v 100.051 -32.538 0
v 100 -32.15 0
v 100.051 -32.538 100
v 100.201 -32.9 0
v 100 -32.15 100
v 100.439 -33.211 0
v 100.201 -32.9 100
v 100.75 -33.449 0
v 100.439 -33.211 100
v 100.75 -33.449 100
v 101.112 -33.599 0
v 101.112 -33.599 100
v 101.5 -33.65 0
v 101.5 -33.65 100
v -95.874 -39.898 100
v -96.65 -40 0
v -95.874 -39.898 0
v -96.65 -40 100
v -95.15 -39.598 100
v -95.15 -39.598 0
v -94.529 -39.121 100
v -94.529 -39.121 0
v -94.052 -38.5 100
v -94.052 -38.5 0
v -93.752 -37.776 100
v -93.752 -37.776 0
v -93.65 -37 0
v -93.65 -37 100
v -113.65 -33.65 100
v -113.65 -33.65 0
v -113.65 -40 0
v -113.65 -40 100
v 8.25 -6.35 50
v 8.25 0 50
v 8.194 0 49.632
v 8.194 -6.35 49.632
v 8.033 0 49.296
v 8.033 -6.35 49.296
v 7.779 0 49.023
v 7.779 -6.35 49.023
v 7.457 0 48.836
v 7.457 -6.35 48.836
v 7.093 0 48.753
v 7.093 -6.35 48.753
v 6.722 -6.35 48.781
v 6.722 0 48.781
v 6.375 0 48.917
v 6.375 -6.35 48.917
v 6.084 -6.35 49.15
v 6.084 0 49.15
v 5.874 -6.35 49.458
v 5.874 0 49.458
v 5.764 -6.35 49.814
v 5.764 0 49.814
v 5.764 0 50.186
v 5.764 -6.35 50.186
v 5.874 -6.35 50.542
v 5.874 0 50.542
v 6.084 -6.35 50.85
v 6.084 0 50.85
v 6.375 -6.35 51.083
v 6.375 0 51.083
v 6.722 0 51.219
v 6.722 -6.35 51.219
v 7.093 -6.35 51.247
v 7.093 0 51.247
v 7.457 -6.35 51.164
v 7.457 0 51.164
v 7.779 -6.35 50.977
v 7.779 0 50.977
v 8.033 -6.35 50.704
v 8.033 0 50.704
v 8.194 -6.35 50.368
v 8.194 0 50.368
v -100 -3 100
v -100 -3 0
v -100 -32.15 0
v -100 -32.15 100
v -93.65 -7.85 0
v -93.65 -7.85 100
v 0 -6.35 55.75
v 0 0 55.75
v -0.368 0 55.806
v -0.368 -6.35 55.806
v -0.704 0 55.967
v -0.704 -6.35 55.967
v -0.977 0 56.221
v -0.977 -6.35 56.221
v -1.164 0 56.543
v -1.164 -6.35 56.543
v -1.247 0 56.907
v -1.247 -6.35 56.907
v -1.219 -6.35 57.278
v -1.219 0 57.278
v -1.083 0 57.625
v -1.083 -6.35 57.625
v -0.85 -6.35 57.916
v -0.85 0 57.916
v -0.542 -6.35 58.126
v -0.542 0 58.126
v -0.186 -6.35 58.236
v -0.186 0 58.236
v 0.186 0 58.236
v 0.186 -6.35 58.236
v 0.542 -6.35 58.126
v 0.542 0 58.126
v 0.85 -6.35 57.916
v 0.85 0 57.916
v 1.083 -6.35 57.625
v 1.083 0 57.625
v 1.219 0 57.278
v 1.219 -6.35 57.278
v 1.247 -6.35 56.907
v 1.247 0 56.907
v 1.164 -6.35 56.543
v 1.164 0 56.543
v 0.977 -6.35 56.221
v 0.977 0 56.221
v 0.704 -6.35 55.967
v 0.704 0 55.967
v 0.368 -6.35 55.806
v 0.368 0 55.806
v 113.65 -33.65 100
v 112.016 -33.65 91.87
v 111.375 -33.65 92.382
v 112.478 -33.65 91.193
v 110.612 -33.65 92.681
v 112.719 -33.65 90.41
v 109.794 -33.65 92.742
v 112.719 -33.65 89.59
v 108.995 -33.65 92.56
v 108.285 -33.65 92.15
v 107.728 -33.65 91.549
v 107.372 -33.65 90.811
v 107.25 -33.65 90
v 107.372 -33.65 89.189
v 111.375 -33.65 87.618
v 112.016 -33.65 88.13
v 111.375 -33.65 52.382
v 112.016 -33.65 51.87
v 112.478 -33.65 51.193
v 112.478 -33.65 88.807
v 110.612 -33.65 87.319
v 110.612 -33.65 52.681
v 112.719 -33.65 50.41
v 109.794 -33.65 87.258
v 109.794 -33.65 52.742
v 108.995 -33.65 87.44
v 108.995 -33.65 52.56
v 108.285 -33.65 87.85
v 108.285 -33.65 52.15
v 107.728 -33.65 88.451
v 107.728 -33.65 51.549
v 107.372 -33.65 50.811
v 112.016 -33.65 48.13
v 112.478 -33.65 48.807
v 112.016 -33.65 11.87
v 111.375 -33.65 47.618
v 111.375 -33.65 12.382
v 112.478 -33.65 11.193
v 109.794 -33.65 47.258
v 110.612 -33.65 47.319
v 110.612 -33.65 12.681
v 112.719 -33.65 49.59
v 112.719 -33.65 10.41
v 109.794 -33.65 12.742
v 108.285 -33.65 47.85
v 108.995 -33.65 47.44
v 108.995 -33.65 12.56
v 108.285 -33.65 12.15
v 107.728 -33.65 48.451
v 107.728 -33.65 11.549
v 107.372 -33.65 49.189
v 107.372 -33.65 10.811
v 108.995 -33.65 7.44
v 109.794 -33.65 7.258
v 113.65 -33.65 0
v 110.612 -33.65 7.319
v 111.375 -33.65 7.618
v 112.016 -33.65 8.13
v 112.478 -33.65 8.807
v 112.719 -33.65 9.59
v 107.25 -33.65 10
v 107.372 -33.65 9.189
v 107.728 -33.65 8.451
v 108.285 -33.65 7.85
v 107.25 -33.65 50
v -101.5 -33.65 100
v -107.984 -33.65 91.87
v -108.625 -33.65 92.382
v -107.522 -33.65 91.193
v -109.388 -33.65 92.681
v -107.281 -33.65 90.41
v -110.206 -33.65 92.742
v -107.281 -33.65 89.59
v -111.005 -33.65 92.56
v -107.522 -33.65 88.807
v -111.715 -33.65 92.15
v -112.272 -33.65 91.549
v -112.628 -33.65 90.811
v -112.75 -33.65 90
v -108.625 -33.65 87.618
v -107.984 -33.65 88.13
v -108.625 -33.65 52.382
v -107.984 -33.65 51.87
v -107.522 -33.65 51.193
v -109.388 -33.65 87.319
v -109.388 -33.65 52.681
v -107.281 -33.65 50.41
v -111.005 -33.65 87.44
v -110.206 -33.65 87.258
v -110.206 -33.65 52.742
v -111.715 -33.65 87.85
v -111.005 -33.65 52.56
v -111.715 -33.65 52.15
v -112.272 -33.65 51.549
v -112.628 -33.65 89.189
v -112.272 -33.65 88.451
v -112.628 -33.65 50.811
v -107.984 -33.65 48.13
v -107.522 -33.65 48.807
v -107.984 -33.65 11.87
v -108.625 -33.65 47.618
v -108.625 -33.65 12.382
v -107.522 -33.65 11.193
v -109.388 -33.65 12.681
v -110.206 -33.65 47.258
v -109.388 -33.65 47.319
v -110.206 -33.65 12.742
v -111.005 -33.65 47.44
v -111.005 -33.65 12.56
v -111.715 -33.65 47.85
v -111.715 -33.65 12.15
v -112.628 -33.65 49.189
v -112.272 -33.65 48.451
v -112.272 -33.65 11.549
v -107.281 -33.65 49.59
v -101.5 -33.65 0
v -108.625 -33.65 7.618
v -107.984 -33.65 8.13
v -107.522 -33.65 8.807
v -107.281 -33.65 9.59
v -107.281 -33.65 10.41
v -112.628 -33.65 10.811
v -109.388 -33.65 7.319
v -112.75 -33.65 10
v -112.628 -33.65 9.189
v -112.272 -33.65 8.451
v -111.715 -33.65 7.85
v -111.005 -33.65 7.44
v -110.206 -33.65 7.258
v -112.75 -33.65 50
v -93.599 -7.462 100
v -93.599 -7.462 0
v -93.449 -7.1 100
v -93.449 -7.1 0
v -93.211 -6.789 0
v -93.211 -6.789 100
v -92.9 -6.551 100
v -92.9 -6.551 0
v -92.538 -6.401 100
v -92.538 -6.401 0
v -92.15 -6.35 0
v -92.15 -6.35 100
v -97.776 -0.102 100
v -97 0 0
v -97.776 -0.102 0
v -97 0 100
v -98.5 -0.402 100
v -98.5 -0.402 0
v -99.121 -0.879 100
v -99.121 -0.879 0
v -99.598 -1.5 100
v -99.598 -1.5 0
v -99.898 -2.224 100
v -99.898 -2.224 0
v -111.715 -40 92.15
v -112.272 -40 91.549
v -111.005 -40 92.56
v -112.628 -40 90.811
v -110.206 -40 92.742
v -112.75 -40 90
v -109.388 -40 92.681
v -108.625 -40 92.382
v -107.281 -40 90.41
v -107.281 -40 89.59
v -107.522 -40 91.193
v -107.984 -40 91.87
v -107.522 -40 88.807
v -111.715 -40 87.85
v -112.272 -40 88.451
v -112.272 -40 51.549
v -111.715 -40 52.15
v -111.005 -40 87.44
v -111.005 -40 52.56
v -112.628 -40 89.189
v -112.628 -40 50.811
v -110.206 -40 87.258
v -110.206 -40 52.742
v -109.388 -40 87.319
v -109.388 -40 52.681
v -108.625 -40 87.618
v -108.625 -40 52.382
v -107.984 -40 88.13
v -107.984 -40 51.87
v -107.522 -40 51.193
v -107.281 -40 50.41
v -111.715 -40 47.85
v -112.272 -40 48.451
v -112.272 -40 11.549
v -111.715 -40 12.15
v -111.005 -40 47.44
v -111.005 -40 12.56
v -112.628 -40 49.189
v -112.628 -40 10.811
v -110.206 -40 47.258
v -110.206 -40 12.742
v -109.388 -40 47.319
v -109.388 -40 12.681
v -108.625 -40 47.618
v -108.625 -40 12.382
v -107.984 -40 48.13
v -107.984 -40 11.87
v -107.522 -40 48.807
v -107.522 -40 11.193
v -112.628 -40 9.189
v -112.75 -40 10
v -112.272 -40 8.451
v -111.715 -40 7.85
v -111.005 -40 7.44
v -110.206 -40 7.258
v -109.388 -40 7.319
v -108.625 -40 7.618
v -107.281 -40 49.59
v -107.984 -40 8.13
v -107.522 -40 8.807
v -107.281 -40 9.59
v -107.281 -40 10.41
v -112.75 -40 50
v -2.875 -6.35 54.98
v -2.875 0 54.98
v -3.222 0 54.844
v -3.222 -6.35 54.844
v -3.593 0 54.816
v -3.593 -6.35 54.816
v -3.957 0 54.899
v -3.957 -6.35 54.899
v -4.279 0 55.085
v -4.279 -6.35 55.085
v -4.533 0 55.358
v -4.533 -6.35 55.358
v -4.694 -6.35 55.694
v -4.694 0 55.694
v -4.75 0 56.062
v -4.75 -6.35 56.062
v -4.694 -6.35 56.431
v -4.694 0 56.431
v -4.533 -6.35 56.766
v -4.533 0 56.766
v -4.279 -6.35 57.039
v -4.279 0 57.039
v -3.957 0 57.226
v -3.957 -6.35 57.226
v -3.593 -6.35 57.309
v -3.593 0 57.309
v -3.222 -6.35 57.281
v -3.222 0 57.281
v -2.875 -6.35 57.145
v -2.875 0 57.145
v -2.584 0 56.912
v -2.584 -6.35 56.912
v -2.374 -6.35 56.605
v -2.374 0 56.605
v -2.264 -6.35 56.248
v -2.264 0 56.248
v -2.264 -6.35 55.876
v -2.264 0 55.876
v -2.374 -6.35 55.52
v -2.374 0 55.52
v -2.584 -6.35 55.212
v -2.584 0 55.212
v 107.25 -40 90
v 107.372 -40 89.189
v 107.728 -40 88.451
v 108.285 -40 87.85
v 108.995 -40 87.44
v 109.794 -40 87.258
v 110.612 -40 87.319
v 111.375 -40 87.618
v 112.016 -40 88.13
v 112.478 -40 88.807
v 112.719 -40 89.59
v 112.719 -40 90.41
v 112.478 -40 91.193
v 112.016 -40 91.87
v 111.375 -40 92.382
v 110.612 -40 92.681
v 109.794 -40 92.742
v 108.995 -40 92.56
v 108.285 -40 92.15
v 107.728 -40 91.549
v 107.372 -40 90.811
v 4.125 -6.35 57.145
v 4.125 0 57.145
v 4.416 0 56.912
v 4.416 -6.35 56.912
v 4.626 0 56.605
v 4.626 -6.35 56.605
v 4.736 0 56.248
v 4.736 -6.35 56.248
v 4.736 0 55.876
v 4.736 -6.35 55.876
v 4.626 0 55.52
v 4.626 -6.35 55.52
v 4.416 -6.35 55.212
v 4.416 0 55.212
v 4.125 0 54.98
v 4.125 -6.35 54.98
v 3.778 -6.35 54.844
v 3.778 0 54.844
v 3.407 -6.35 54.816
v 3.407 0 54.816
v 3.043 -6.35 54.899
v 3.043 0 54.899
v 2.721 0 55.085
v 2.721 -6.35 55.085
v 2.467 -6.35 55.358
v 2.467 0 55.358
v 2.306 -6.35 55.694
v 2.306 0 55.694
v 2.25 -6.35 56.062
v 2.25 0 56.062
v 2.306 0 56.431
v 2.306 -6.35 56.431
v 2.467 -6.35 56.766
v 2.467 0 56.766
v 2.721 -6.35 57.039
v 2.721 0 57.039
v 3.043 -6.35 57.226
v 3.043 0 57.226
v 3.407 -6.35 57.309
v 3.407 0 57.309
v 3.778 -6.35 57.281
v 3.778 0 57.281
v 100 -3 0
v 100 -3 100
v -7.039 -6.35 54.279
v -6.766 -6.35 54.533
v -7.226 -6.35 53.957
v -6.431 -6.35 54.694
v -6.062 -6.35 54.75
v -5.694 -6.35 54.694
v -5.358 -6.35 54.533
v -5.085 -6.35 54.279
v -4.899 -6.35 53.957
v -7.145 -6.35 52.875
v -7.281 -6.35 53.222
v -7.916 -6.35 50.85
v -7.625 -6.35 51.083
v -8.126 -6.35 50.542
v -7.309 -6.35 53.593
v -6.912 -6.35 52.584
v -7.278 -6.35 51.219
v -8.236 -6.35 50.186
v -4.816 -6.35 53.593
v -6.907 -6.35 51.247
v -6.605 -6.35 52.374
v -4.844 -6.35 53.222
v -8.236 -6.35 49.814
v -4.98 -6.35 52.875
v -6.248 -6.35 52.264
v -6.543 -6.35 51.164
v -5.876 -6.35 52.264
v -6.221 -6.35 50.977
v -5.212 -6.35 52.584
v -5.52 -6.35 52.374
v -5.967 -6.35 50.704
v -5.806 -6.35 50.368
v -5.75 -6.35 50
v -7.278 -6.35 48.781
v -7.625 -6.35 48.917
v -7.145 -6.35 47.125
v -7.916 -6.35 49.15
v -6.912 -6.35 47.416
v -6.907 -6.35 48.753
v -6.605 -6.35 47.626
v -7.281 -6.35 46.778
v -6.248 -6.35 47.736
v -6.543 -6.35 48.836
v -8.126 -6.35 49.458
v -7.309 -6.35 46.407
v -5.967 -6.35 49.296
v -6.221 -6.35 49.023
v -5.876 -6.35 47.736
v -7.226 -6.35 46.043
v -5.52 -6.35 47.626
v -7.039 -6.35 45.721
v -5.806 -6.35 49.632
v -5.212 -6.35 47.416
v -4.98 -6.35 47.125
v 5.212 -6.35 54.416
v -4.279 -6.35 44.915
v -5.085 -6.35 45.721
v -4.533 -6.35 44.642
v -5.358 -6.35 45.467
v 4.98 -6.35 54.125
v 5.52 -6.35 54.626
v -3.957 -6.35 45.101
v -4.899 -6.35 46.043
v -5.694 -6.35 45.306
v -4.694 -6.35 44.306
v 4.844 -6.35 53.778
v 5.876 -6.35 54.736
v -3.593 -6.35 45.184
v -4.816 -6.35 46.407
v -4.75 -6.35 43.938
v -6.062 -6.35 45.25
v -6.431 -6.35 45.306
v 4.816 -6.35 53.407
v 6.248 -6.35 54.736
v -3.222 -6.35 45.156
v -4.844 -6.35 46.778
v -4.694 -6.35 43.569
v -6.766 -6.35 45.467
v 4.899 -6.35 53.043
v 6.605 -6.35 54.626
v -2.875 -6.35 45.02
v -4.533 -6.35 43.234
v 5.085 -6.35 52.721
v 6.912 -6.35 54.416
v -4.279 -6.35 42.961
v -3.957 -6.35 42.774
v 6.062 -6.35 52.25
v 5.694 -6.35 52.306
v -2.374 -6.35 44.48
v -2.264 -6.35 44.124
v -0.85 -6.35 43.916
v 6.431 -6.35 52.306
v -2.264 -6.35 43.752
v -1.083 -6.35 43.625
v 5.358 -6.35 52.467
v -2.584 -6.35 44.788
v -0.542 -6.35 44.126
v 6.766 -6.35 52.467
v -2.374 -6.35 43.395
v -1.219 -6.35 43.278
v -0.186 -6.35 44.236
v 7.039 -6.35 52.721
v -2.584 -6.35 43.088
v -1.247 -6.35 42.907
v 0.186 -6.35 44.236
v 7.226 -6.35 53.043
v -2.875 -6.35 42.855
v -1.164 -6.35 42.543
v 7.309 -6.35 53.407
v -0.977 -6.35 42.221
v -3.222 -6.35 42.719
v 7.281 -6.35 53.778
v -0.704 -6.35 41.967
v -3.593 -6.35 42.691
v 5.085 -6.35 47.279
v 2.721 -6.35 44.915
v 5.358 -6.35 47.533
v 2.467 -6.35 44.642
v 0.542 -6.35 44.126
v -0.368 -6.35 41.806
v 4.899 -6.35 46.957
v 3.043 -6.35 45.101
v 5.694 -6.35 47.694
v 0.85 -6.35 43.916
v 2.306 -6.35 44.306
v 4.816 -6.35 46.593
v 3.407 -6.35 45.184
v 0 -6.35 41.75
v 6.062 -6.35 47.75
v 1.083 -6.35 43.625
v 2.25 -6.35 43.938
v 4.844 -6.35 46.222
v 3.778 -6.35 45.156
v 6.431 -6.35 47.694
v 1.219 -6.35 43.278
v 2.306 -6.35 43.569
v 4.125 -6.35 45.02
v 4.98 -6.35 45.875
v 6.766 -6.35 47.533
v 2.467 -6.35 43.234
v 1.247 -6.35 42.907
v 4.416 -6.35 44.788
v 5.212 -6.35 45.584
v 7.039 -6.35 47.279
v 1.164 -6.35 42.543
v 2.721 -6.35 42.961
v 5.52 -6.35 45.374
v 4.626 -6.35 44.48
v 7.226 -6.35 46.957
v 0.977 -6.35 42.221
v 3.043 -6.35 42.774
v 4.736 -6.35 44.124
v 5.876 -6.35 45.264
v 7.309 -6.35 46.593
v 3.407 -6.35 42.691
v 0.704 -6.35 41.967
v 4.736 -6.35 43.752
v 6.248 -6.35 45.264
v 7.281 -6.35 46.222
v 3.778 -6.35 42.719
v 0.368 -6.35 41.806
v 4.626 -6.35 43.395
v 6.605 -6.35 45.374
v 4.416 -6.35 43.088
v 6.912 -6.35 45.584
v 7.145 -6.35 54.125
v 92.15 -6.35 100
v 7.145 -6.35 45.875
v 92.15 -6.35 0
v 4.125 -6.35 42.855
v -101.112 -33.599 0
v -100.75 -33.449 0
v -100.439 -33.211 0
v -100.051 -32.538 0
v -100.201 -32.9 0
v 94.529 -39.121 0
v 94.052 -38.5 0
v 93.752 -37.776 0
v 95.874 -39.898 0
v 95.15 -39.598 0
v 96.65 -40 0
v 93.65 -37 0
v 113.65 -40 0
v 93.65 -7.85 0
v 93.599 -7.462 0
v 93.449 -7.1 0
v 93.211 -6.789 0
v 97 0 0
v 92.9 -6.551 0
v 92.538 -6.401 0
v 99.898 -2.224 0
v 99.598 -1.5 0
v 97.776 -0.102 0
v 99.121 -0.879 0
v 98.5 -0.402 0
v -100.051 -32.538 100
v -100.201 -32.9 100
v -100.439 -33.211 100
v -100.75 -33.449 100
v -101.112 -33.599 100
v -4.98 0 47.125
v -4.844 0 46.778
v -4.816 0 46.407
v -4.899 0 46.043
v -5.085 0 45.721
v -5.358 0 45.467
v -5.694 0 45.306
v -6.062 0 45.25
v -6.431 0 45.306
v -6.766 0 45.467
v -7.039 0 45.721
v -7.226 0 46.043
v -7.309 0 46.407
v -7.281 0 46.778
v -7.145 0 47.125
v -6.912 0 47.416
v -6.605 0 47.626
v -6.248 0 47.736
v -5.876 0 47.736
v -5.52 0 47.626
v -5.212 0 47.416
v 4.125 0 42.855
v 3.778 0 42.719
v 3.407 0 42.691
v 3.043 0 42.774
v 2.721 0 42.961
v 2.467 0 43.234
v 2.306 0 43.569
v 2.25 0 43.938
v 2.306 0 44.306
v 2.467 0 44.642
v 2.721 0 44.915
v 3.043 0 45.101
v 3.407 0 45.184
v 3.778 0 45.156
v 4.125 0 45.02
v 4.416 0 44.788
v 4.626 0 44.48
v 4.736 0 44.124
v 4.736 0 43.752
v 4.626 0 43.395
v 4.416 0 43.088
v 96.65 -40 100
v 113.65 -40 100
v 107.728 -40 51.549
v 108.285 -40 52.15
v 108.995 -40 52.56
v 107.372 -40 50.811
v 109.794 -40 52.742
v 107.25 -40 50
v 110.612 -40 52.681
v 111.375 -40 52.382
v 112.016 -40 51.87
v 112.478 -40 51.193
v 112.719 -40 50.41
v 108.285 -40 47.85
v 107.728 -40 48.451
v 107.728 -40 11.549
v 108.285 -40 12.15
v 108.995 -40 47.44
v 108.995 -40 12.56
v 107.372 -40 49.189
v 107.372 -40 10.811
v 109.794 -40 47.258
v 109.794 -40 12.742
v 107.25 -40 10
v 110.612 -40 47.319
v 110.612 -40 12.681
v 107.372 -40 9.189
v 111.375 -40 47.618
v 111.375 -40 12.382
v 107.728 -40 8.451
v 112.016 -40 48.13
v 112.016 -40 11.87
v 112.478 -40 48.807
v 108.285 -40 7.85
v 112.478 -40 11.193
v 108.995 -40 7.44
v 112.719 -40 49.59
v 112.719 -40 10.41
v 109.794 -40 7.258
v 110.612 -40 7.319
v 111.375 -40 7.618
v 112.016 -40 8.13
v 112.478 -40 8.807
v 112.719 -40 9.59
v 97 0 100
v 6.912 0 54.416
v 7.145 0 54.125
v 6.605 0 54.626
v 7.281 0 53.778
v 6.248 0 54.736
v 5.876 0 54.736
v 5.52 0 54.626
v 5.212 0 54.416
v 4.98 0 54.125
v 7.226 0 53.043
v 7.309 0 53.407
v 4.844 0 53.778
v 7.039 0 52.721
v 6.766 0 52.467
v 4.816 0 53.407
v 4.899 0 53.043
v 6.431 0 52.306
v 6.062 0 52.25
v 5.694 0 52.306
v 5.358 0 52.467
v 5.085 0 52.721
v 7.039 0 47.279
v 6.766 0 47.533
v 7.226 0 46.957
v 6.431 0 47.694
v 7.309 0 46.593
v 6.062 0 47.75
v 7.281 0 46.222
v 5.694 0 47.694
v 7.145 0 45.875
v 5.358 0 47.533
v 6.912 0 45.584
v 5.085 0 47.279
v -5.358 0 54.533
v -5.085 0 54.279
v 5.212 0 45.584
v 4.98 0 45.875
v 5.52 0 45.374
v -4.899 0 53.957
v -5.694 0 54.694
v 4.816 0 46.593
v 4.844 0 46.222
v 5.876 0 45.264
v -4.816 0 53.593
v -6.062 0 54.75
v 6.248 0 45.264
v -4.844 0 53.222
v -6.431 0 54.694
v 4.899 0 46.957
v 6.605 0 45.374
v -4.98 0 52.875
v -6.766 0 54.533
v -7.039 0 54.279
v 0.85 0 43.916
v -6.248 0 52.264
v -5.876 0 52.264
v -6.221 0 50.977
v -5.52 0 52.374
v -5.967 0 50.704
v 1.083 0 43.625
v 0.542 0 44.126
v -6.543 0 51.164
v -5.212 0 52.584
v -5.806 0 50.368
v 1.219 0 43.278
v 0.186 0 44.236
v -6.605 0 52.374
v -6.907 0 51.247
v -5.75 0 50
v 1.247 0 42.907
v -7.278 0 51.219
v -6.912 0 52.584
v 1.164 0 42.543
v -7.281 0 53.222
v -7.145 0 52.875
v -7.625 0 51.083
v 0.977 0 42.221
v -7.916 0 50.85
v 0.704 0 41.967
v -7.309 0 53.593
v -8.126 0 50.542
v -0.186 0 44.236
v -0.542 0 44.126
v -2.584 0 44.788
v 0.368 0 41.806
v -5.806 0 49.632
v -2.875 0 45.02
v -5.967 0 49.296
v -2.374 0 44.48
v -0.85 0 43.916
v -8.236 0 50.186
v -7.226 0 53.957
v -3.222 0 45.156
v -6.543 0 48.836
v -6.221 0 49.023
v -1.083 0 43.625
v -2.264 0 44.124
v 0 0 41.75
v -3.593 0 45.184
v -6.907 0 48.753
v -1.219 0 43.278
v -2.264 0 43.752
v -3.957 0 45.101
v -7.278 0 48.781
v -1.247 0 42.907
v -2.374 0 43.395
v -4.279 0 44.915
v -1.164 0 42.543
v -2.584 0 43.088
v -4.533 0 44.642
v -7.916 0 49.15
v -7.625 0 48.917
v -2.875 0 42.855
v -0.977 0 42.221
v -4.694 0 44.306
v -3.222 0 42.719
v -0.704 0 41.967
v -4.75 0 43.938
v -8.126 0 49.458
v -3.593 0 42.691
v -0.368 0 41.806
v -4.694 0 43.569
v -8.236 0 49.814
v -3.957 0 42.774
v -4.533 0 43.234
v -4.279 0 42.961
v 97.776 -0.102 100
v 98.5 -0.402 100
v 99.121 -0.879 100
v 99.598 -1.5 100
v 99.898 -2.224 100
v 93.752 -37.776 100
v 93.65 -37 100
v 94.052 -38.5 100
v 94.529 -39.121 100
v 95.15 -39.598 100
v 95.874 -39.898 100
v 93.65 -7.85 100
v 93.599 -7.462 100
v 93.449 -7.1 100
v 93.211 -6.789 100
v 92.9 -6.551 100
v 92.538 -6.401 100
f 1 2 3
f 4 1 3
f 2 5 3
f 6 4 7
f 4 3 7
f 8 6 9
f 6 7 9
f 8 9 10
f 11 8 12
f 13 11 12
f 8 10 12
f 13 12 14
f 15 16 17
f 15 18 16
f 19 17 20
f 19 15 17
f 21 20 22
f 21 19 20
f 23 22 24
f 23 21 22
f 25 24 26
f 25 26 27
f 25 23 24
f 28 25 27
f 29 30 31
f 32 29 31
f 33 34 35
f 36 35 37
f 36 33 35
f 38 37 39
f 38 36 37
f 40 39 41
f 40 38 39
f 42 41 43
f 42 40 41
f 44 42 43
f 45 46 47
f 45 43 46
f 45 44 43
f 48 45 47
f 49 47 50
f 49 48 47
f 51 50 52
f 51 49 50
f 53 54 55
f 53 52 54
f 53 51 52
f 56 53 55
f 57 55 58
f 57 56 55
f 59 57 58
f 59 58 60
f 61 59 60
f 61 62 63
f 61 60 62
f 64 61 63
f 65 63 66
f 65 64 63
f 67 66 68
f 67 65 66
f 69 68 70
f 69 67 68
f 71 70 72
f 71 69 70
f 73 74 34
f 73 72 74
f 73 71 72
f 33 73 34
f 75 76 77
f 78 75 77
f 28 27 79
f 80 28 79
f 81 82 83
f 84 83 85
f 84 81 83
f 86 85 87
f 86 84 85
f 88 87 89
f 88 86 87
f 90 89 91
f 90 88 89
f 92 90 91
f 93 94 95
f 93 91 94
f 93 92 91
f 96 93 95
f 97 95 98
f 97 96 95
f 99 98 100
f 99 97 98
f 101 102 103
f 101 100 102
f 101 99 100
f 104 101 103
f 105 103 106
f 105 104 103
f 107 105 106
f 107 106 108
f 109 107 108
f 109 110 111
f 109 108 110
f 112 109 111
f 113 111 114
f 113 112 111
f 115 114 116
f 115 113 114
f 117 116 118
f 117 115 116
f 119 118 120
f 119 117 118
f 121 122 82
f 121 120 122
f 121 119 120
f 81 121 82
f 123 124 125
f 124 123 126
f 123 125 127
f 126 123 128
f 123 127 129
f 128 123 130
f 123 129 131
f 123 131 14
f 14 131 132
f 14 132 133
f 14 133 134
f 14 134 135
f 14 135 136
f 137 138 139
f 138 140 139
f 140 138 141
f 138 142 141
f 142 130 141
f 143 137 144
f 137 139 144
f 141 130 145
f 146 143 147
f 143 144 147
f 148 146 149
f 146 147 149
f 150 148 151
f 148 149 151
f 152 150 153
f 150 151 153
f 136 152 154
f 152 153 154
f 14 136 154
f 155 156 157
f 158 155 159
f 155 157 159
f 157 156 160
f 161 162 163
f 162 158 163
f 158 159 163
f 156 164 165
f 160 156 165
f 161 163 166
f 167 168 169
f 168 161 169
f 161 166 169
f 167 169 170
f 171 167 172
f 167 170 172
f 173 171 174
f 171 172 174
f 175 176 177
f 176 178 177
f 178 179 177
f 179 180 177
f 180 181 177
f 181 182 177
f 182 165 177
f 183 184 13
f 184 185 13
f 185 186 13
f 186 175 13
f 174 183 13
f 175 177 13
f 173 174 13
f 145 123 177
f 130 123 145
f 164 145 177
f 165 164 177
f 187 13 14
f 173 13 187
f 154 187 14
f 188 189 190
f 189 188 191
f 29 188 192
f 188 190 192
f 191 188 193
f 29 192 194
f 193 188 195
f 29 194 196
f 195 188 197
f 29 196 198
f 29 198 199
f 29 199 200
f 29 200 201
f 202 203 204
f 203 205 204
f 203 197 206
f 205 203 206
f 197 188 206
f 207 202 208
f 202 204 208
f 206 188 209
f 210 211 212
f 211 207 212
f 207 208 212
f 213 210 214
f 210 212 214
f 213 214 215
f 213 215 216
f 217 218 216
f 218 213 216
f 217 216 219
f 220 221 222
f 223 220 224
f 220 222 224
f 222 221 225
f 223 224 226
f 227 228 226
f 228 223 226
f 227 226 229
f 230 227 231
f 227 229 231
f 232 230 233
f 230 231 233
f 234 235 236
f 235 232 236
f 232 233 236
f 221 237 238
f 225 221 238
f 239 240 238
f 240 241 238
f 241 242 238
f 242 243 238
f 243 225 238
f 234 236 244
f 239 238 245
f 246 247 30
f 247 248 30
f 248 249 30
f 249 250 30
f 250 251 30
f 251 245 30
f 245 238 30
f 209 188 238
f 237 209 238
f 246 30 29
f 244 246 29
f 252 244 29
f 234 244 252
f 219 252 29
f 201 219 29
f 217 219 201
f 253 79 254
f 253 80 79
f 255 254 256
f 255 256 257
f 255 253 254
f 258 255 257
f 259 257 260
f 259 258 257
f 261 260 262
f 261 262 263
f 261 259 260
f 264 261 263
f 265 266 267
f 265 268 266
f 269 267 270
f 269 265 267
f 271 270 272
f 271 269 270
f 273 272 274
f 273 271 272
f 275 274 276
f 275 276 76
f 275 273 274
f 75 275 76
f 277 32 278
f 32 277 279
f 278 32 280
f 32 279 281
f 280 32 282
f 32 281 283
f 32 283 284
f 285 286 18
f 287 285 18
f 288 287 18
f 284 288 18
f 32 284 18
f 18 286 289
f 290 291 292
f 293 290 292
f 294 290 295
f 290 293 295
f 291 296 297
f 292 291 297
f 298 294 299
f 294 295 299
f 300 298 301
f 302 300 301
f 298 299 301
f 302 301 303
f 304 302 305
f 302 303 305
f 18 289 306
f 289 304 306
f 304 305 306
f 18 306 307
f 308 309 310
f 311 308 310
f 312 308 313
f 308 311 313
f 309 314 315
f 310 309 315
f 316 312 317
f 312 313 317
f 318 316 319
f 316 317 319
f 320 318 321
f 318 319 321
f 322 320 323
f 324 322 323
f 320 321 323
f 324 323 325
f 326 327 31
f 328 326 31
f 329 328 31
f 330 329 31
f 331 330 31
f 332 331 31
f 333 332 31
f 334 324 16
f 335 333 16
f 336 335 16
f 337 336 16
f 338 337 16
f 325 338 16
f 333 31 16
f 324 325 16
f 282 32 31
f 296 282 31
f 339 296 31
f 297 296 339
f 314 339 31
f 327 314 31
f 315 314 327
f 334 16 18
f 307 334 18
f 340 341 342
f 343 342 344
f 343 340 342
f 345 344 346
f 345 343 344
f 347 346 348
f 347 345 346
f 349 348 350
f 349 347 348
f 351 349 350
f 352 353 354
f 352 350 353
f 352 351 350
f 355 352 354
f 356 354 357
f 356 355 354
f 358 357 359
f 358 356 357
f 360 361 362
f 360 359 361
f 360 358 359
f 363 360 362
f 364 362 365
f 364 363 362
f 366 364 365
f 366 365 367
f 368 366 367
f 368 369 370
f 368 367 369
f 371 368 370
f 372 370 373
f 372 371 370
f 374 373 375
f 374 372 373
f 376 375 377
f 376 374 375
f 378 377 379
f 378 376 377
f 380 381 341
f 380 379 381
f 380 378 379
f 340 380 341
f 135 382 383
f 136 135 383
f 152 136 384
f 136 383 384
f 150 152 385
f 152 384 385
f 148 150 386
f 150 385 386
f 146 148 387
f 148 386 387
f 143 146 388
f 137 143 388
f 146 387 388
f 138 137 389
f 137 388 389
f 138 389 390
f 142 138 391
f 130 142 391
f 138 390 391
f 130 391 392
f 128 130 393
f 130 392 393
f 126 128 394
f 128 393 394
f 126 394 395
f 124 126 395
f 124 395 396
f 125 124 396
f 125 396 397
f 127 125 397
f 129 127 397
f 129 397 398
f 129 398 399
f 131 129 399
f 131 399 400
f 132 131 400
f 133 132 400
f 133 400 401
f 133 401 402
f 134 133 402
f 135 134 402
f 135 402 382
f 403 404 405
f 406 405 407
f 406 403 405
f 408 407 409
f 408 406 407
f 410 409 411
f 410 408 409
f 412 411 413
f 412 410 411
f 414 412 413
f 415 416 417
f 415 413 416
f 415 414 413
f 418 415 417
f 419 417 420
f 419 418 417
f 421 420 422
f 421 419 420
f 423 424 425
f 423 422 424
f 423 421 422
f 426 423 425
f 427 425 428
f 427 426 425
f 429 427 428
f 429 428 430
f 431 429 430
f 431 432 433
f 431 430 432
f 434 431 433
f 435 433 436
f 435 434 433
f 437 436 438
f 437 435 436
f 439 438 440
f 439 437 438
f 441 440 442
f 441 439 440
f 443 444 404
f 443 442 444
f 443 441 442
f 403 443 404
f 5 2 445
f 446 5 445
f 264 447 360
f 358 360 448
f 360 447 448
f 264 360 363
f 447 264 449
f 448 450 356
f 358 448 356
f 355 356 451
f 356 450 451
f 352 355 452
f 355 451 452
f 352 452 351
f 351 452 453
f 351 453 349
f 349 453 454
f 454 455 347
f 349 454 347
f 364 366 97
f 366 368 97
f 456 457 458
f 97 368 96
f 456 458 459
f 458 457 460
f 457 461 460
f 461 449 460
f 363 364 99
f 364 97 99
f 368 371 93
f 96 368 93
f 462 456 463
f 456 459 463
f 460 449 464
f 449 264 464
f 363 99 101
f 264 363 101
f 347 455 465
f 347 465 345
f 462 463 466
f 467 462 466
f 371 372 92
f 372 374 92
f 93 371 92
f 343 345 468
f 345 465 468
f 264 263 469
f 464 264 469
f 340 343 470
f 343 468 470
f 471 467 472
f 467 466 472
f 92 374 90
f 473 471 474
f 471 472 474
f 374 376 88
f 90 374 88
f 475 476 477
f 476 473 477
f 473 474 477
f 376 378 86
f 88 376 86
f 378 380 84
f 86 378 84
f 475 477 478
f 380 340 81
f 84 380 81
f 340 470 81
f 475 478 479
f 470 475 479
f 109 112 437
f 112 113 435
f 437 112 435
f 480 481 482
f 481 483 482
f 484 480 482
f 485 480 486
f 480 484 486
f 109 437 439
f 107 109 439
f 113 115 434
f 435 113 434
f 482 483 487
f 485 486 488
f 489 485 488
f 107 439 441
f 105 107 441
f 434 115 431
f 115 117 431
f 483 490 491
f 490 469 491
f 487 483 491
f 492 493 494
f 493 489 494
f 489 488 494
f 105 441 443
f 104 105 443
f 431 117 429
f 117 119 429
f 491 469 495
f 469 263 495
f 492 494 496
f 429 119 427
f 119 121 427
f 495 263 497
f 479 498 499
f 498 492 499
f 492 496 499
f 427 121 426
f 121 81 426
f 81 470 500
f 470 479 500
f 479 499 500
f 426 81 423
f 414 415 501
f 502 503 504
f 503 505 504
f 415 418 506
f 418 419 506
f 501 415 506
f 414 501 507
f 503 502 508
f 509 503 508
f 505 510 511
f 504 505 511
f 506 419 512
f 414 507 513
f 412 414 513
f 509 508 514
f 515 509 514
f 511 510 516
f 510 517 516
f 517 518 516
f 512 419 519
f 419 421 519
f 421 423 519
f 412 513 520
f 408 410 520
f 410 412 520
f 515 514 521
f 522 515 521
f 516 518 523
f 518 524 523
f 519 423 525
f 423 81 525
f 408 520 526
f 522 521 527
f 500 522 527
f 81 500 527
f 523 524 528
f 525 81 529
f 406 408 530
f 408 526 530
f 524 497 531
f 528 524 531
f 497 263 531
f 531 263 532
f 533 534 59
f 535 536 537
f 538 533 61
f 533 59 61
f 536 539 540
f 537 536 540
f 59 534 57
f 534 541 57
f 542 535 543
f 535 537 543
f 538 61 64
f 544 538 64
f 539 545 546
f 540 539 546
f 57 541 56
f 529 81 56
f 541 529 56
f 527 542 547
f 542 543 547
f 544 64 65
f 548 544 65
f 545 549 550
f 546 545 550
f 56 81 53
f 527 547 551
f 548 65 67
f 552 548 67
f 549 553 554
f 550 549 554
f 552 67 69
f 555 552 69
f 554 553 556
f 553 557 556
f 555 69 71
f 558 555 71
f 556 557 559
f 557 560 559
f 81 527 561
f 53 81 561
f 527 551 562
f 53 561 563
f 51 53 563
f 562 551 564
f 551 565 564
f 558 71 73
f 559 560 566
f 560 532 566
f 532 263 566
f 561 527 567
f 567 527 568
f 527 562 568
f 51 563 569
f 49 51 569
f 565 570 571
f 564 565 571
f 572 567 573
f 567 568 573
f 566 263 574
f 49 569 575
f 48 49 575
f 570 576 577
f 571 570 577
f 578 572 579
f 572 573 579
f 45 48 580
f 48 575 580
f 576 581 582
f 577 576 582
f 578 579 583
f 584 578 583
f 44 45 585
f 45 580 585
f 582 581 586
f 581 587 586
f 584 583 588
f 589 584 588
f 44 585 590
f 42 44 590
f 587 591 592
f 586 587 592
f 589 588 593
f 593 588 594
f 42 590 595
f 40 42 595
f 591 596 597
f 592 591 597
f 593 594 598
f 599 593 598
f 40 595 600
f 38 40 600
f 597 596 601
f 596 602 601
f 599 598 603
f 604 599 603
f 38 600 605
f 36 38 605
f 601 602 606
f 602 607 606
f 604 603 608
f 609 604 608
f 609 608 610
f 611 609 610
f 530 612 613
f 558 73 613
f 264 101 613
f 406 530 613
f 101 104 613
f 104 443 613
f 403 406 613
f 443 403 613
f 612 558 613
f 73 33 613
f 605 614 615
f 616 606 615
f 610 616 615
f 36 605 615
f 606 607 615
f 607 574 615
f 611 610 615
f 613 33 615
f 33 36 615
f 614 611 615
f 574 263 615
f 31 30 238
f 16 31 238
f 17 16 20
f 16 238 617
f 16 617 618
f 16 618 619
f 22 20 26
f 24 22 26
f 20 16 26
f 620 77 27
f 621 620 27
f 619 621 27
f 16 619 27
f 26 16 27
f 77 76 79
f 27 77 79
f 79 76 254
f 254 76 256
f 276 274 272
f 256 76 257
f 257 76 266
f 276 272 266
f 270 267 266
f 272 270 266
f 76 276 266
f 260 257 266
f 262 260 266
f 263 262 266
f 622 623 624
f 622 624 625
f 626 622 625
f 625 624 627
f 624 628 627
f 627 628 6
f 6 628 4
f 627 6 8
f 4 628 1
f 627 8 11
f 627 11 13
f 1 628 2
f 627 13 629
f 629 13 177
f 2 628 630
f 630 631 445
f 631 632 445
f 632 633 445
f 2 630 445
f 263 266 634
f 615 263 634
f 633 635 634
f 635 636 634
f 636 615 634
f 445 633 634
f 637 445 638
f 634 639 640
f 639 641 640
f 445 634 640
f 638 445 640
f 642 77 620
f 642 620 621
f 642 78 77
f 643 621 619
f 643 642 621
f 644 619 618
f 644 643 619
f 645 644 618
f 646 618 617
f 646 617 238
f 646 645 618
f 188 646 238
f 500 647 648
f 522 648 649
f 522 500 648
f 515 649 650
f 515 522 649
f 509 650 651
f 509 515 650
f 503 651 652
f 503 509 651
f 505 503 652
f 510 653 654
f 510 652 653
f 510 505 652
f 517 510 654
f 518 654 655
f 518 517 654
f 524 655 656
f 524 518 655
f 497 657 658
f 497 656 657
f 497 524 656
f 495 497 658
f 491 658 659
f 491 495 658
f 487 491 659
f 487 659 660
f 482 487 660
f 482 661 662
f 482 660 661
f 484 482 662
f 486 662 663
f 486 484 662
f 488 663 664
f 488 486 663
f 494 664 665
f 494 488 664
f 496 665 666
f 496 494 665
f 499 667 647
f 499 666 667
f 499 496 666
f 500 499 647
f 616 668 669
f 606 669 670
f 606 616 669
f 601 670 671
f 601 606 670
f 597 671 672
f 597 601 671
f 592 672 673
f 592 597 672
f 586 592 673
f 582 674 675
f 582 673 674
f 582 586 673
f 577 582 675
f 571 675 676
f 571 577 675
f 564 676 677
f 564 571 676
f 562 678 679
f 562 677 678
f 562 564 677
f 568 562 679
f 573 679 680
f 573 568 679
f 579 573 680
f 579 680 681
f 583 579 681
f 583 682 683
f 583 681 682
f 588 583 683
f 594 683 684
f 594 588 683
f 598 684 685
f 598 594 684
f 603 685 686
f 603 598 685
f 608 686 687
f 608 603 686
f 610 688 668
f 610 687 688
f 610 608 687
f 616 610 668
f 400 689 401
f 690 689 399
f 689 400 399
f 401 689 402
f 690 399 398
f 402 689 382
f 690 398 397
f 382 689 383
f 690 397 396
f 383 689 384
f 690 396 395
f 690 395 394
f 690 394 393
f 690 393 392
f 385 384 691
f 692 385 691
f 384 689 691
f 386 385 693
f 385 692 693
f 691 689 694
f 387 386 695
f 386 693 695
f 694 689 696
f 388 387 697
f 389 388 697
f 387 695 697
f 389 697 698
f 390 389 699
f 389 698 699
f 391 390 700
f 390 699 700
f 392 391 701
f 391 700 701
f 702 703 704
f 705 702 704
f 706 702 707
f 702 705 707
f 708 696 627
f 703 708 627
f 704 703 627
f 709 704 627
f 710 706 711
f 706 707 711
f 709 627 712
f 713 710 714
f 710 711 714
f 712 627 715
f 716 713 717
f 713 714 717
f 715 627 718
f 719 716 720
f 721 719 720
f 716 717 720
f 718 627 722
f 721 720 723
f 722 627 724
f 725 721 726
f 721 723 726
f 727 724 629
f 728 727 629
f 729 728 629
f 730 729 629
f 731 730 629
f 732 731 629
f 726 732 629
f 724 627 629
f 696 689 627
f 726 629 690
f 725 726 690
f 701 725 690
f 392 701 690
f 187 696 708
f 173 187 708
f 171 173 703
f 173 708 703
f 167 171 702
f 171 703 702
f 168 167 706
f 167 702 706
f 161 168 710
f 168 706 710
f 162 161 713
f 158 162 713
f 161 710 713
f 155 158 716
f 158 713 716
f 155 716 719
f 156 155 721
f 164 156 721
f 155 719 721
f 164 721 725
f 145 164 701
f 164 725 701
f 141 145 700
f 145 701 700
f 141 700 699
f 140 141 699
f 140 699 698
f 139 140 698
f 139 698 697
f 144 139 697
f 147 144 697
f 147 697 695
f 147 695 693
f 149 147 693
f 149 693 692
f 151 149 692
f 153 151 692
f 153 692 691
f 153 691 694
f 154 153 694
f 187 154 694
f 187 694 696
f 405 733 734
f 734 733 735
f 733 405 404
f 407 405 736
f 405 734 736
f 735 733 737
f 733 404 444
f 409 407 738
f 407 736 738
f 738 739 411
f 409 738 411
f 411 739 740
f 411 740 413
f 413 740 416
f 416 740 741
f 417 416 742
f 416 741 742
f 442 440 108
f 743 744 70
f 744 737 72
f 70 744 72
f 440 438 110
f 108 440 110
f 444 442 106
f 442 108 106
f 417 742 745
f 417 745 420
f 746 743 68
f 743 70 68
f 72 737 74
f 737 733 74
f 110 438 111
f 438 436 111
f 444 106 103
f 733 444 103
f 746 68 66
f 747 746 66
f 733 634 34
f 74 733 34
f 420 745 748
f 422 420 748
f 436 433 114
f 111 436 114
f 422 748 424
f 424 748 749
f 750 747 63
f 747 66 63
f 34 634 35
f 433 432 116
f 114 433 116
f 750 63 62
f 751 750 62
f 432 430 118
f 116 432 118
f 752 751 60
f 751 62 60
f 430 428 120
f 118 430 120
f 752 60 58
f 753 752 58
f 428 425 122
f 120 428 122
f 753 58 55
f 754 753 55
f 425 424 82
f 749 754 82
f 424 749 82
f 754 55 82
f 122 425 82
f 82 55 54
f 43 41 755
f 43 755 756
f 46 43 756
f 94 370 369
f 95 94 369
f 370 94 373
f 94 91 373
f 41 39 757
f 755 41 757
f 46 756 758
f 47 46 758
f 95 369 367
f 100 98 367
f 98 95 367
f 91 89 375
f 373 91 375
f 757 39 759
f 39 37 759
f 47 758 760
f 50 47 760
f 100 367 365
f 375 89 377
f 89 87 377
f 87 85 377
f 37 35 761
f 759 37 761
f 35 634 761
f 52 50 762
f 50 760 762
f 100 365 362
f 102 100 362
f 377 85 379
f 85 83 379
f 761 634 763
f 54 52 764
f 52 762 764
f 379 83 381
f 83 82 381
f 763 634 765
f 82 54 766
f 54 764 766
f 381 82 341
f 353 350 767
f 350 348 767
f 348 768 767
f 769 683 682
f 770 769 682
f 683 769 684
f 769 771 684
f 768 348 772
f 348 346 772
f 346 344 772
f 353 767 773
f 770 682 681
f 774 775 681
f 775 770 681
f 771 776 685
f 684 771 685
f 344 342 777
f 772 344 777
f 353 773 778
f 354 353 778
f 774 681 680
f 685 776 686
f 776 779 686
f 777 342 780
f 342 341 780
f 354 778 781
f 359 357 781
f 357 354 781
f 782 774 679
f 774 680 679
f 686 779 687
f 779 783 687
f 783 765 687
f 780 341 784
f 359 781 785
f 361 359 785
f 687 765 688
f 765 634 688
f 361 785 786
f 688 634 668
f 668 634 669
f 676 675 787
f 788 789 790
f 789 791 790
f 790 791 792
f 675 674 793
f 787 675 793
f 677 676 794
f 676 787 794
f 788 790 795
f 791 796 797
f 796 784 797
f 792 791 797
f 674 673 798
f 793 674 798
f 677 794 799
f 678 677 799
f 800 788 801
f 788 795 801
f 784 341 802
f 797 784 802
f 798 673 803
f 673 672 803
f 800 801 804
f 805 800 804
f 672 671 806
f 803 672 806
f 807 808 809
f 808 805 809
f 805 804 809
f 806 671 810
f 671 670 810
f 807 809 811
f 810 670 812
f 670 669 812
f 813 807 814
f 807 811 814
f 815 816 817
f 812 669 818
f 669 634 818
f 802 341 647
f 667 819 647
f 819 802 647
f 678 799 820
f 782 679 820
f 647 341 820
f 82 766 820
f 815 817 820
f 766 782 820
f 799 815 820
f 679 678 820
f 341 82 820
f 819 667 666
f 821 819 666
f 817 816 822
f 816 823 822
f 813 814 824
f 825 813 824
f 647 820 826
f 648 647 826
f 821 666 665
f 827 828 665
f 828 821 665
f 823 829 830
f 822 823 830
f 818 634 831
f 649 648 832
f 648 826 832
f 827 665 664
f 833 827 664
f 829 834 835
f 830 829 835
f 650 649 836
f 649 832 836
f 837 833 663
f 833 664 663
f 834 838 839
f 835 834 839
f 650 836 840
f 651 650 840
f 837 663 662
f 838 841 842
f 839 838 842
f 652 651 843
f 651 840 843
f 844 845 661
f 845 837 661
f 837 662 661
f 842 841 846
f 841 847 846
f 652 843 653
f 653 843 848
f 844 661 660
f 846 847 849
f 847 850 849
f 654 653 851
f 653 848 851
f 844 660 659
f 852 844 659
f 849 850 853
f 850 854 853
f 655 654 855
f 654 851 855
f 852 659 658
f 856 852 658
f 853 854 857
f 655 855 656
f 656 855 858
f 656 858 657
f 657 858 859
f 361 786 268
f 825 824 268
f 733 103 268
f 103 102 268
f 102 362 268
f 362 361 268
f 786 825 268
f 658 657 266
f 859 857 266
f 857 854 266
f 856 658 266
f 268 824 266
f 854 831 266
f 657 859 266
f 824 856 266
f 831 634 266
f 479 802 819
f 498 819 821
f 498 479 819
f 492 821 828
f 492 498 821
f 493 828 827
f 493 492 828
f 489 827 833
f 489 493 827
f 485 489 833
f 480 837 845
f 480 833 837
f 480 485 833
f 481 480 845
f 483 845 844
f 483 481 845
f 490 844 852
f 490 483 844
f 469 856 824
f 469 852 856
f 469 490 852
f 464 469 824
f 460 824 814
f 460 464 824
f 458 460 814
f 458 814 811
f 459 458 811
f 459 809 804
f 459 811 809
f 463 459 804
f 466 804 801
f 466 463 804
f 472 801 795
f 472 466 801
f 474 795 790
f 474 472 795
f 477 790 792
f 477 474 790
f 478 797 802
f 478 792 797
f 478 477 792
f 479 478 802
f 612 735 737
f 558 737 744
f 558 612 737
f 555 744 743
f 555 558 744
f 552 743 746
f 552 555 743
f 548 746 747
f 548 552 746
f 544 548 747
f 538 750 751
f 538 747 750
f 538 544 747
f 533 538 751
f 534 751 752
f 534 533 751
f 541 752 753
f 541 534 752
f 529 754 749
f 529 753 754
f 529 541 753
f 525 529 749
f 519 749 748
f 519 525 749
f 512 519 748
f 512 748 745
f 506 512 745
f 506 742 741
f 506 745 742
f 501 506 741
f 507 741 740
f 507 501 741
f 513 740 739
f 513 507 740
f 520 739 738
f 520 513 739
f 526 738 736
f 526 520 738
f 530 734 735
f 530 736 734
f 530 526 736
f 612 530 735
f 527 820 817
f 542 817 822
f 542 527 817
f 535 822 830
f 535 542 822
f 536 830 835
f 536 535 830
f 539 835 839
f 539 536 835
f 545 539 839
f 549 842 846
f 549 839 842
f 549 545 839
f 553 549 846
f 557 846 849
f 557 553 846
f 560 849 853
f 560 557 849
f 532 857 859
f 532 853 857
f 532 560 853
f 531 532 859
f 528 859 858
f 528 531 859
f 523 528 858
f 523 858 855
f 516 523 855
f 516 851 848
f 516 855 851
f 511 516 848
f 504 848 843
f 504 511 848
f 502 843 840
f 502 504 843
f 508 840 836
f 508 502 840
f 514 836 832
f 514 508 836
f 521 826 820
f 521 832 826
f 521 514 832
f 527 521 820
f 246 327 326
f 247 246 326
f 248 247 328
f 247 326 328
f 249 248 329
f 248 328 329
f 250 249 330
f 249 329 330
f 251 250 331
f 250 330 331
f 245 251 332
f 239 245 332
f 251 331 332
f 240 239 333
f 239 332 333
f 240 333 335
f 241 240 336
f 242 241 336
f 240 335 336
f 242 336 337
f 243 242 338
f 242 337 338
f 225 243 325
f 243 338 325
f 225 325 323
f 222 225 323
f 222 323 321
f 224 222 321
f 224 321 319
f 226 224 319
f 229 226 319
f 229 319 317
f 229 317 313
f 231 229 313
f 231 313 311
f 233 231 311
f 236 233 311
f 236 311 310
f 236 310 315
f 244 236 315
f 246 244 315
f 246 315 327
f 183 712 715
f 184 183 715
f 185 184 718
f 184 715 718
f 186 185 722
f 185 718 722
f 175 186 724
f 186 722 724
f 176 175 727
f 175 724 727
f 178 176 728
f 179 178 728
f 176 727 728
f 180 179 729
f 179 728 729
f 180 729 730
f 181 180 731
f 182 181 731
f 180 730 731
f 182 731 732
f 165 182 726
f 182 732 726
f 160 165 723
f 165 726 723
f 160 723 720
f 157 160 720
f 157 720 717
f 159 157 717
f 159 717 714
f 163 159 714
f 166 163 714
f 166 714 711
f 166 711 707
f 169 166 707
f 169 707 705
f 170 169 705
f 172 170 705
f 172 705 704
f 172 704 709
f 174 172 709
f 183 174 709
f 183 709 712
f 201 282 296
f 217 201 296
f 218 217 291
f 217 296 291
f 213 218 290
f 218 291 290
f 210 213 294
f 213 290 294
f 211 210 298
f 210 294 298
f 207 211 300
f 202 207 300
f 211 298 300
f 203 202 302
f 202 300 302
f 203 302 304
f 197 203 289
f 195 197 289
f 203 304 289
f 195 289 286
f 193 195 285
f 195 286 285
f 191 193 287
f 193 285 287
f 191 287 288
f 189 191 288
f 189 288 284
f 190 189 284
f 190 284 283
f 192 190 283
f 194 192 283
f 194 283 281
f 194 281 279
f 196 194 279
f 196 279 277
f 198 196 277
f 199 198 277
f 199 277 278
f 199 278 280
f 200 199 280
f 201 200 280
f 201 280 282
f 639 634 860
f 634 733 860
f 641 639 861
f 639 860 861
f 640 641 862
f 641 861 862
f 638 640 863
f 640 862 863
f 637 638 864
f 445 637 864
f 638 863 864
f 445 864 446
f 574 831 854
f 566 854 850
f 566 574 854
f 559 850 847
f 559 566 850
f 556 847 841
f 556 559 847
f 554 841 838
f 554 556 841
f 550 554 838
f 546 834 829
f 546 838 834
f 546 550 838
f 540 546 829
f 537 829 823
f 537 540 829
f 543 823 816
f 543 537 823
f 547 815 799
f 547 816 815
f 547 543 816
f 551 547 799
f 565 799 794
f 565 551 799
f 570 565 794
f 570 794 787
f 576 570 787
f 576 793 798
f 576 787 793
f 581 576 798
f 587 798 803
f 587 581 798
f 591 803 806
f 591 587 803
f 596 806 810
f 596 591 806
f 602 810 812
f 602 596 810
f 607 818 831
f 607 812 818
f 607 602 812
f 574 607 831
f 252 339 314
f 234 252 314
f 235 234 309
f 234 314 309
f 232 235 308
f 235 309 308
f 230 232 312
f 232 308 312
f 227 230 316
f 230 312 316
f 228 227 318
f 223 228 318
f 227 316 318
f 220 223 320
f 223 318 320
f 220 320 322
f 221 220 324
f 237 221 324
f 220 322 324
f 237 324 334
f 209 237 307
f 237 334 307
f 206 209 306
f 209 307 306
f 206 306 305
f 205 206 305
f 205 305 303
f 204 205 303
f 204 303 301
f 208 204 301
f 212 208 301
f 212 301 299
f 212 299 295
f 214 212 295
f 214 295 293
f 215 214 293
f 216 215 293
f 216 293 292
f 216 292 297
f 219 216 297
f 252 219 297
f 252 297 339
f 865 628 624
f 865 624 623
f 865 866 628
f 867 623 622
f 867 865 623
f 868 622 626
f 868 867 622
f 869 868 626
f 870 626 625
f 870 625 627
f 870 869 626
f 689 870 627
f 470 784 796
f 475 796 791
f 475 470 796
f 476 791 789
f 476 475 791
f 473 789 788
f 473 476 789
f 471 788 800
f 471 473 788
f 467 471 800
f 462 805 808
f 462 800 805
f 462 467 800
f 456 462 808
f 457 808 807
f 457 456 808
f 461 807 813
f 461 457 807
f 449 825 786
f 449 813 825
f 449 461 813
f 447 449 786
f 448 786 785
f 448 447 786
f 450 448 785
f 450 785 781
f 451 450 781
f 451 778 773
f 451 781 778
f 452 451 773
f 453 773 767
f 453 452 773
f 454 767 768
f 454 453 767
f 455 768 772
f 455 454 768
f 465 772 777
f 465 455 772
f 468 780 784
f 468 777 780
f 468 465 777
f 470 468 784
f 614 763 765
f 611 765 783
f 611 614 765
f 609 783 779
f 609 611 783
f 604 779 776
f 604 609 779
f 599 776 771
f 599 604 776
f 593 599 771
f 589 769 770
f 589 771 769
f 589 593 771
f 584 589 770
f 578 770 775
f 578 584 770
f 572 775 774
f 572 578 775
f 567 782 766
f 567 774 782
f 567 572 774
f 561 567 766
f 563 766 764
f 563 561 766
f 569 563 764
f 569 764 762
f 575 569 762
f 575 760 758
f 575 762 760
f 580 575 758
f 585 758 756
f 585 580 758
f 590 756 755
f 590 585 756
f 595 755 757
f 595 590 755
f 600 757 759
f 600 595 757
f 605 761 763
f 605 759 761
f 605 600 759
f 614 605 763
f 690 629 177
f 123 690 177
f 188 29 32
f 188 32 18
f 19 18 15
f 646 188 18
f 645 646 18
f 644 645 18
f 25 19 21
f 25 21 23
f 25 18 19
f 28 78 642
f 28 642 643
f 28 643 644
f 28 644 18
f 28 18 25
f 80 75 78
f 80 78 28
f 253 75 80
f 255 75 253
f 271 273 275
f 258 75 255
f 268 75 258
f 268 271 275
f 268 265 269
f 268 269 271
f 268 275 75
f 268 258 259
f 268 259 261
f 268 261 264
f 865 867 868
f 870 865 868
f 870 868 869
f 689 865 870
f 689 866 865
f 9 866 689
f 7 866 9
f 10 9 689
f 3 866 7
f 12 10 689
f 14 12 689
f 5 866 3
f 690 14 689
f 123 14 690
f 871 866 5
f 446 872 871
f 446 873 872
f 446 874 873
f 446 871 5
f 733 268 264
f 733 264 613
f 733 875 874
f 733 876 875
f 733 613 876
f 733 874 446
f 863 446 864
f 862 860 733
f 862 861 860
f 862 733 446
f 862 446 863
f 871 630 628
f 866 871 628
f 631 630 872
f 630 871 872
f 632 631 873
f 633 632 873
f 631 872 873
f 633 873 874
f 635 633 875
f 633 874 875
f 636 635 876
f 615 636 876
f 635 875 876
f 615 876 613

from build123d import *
from OCP.BRepFilletAPI import BRepFilletAPI_MakeFillet

# Parameters (mm, degrees)
BOSS_EXTRUDE1_DEPTH            = 100
FILLET1_R1                     = 3
FILLET1_R2                     = 1.5
F_2_5MM_DOWEL_HOLE1_AT_2_COUNT = 2
F_2_5MM_DOWEL_HOLE1_AT_2_PITCH = 14
CIRPATTERN3_COUNT              = 6
CIRPATTERN3_ANGLE              = 150
F_5_5_5_5_DIAMETER_HOLE1_D     = 5.5


with BuildPart() as part:
    # Sketch1 → Boss-Extrude1 (new body)
    with BuildSketch(Plane.XY):
        Polygon((100, 0), (-100, 0), (-100, -33.65), (-113.65, -33.65), (-113.65, -40), (-93.65, -40), (-93.65, -6.35), (93.65, -6.35), (93.65, -40), (113.65, -40), (113.65, -33.65), (100, -33.65), align=None)
    extrude(amount=BOSS_EXTRUDE1_DEPTH)

    # Fillet1: one fillet with a radius per group of edges: ONE call of the kernel's fillet builder (fillet() takes one radius for all edges)
    fillet1_edges_1 = [part.edges().sort_by_distance(p)[0] for p in [
        (-100, 0, 50),
        (-93.65, -40, 50),
        (100, 0, 50),
        (93.65, -40, 50),
    ]]
    fillet1_edges_2 = [part.edges().sort_by_distance(p)[0] for p in [
        (-93.65, -6.35, 50),
        (93.65, -6.35, 50),
        (100, -33.65, 50),
        (-100, -33.65, 50),
    ]]
    fillet1 = BRepFilletAPI_MakeFillet(part.part.solid().wrapped)
    for e in fillet1_edges_1:
        fillet1.Add(FILLET1_R1, e.wrapped)
    for e in fillet1_edges_2:
        fillet1.Add(FILLET1_R2, e.wrapped)
    add(Compound.cast(fillet1.Shape()), mode=Mode.REPLACE)

    # Sketch2 → Ø2.5mm Dowel Hole1 (revolve, cut)
    with BuildSketch(Plane(origin=(0, -6.35, 57), x_dir=(0, 0, -1), z_dir=(1, 0, 0))):
        Polygon((0, 0), (0, 10.751075774), (1.25, 10), (1.25, 0), align=None)
    f_2_5mm_dowel_hole1 = revolve(axis=Axis((0, -12.7, 57), (0, 1, 0)), mode=Mode.SUBTRACT)

    # Ø2.5mm Dowel Hole1 at 2: Ø2.5mm Dowel Hole1 ×2
    with Locations(*[(0, 0, -i * F_2_5MM_DOWEL_HOLE1_AT_2_PITCH) for i in range(1, F_2_5MM_DOWEL_HOLE1_AT_2_COUNT)]):
        add(f_2_5mm_dowel_hole1, mode=Mode.SUBTRACT)

    # CirPattern3: Ø2.5mm Dowel Hole1 ×6 about axis
    cirpattern3_axis = Axis((0, -6.35, 50), (0, -1, 0))
    for i in range(1, CIRPATTERN3_COUNT):
        add(f_2_5mm_dowel_hole1.rotate(cirpattern3_axis, i * CIRPATTERN3_ANGLE / (CIRPATTERN3_COUNT - 1)), mode=Mode.SUBTRACT)

    # CirPattern3 copy 1 sketch → CirPattern3 copy 1 (revolve, cut)
    with BuildSketch(Plane(origin=(3.5, -6.35, 43.937822174), x_dir=(0.500000000000001, 0, -0.866025403784438), z_dir=(0.866025403784438, 0, 0.500000000000001))):
        Polygon((0, 0), (0, 10.751075774), (1.25, 10), (1.25, 0), align=None)
    revolve(axis=Axis((3.5, -12.7, 43.937822174), (0, 1, 0)), mode=Mode.SUBTRACT)

    # CirPattern3 copy 2 sketch → CirPattern3 copy 2 (revolve, cut)
    with BuildSketch(Plane(origin=(6.062177826, -6.35, 46.5), x_dir=(0.8660254037844398, 0, -0.499999999999998), z_dir=(0.499999999999998, 0, 0.8660254037844398))):
        Polygon((0, 0), (0, 10.751075774), (1.25, 10), (1.25, 0), align=None)
    revolve(axis=Axis((6.062177826, -12.7, 46.5), (0, 1, 0)), mode=Mode.SUBTRACT)

    # CirPattern3 copy 3 sketch → CirPattern3 copy 3 (revolve, cut)
    with BuildSketch(Plane(origin=(7, -6.35, 50), x_dir=(1, 0, 0), z_dir=(0, 0, 1))):
        Polygon((0, 0), (0, 10.751075774), (1.25, 10), (1.25, 0), align=None)
    revolve(axis=Axis((7, -12.7, 50), (0, 1, 0)), mode=Mode.SUBTRACT)

    # CirPattern3 copy 4 sketch → CirPattern3 copy 4 (revolve, cut)
    with BuildSketch(Plane(origin=(6.062177826, -6.35, 53.5), x_dir=(0.8660254037844363, 0, 0.500000000000004), z_dir=(-0.500000000000004, 0, 0.8660254037844363))):
        Polygon((0, 0), (0, 10.751075774), (1.25, 10), (1.25, 0), align=None)
    revolve(axis=Axis((6.062177826, -12.7, 53.5), (0, 1, 0)), mode=Mode.SUBTRACT)

    # CirPattern3 copy 5 sketch → CirPattern3 copy 5 (revolve, cut)
    with BuildSketch(Plane(origin=(3.5, -6.35, 56.062177826), x_dir=(0.49999999999999495, 0, 0.8660254037844416), z_dir=(-0.8660254037844416, 0, 0.49999999999999495))):
        Polygon((0, 0), (0, 10.751075774), (1.25, 10), (1.25, 0), align=None)
    revolve(axis=Axis((3.5, -12.7, 56.062177826), (0, 1, 0)), mode=Mode.SUBTRACT)

    # Ø5.5 (5.5) Diameter Hole1 (through all)
    with Locations(Plane(origin=(0, -33.65, 0), x_dir=(1, 0, 0), z_dir=(0, 1, 0))):
        with Locations((-110, -10), (-110, -50), (-110, -90), (110, -90), (110, -50), (110, -10)):
            Hole(F_5_5_5_5_DIAMETER_HOLE1_D / 2)


solid = part.part
